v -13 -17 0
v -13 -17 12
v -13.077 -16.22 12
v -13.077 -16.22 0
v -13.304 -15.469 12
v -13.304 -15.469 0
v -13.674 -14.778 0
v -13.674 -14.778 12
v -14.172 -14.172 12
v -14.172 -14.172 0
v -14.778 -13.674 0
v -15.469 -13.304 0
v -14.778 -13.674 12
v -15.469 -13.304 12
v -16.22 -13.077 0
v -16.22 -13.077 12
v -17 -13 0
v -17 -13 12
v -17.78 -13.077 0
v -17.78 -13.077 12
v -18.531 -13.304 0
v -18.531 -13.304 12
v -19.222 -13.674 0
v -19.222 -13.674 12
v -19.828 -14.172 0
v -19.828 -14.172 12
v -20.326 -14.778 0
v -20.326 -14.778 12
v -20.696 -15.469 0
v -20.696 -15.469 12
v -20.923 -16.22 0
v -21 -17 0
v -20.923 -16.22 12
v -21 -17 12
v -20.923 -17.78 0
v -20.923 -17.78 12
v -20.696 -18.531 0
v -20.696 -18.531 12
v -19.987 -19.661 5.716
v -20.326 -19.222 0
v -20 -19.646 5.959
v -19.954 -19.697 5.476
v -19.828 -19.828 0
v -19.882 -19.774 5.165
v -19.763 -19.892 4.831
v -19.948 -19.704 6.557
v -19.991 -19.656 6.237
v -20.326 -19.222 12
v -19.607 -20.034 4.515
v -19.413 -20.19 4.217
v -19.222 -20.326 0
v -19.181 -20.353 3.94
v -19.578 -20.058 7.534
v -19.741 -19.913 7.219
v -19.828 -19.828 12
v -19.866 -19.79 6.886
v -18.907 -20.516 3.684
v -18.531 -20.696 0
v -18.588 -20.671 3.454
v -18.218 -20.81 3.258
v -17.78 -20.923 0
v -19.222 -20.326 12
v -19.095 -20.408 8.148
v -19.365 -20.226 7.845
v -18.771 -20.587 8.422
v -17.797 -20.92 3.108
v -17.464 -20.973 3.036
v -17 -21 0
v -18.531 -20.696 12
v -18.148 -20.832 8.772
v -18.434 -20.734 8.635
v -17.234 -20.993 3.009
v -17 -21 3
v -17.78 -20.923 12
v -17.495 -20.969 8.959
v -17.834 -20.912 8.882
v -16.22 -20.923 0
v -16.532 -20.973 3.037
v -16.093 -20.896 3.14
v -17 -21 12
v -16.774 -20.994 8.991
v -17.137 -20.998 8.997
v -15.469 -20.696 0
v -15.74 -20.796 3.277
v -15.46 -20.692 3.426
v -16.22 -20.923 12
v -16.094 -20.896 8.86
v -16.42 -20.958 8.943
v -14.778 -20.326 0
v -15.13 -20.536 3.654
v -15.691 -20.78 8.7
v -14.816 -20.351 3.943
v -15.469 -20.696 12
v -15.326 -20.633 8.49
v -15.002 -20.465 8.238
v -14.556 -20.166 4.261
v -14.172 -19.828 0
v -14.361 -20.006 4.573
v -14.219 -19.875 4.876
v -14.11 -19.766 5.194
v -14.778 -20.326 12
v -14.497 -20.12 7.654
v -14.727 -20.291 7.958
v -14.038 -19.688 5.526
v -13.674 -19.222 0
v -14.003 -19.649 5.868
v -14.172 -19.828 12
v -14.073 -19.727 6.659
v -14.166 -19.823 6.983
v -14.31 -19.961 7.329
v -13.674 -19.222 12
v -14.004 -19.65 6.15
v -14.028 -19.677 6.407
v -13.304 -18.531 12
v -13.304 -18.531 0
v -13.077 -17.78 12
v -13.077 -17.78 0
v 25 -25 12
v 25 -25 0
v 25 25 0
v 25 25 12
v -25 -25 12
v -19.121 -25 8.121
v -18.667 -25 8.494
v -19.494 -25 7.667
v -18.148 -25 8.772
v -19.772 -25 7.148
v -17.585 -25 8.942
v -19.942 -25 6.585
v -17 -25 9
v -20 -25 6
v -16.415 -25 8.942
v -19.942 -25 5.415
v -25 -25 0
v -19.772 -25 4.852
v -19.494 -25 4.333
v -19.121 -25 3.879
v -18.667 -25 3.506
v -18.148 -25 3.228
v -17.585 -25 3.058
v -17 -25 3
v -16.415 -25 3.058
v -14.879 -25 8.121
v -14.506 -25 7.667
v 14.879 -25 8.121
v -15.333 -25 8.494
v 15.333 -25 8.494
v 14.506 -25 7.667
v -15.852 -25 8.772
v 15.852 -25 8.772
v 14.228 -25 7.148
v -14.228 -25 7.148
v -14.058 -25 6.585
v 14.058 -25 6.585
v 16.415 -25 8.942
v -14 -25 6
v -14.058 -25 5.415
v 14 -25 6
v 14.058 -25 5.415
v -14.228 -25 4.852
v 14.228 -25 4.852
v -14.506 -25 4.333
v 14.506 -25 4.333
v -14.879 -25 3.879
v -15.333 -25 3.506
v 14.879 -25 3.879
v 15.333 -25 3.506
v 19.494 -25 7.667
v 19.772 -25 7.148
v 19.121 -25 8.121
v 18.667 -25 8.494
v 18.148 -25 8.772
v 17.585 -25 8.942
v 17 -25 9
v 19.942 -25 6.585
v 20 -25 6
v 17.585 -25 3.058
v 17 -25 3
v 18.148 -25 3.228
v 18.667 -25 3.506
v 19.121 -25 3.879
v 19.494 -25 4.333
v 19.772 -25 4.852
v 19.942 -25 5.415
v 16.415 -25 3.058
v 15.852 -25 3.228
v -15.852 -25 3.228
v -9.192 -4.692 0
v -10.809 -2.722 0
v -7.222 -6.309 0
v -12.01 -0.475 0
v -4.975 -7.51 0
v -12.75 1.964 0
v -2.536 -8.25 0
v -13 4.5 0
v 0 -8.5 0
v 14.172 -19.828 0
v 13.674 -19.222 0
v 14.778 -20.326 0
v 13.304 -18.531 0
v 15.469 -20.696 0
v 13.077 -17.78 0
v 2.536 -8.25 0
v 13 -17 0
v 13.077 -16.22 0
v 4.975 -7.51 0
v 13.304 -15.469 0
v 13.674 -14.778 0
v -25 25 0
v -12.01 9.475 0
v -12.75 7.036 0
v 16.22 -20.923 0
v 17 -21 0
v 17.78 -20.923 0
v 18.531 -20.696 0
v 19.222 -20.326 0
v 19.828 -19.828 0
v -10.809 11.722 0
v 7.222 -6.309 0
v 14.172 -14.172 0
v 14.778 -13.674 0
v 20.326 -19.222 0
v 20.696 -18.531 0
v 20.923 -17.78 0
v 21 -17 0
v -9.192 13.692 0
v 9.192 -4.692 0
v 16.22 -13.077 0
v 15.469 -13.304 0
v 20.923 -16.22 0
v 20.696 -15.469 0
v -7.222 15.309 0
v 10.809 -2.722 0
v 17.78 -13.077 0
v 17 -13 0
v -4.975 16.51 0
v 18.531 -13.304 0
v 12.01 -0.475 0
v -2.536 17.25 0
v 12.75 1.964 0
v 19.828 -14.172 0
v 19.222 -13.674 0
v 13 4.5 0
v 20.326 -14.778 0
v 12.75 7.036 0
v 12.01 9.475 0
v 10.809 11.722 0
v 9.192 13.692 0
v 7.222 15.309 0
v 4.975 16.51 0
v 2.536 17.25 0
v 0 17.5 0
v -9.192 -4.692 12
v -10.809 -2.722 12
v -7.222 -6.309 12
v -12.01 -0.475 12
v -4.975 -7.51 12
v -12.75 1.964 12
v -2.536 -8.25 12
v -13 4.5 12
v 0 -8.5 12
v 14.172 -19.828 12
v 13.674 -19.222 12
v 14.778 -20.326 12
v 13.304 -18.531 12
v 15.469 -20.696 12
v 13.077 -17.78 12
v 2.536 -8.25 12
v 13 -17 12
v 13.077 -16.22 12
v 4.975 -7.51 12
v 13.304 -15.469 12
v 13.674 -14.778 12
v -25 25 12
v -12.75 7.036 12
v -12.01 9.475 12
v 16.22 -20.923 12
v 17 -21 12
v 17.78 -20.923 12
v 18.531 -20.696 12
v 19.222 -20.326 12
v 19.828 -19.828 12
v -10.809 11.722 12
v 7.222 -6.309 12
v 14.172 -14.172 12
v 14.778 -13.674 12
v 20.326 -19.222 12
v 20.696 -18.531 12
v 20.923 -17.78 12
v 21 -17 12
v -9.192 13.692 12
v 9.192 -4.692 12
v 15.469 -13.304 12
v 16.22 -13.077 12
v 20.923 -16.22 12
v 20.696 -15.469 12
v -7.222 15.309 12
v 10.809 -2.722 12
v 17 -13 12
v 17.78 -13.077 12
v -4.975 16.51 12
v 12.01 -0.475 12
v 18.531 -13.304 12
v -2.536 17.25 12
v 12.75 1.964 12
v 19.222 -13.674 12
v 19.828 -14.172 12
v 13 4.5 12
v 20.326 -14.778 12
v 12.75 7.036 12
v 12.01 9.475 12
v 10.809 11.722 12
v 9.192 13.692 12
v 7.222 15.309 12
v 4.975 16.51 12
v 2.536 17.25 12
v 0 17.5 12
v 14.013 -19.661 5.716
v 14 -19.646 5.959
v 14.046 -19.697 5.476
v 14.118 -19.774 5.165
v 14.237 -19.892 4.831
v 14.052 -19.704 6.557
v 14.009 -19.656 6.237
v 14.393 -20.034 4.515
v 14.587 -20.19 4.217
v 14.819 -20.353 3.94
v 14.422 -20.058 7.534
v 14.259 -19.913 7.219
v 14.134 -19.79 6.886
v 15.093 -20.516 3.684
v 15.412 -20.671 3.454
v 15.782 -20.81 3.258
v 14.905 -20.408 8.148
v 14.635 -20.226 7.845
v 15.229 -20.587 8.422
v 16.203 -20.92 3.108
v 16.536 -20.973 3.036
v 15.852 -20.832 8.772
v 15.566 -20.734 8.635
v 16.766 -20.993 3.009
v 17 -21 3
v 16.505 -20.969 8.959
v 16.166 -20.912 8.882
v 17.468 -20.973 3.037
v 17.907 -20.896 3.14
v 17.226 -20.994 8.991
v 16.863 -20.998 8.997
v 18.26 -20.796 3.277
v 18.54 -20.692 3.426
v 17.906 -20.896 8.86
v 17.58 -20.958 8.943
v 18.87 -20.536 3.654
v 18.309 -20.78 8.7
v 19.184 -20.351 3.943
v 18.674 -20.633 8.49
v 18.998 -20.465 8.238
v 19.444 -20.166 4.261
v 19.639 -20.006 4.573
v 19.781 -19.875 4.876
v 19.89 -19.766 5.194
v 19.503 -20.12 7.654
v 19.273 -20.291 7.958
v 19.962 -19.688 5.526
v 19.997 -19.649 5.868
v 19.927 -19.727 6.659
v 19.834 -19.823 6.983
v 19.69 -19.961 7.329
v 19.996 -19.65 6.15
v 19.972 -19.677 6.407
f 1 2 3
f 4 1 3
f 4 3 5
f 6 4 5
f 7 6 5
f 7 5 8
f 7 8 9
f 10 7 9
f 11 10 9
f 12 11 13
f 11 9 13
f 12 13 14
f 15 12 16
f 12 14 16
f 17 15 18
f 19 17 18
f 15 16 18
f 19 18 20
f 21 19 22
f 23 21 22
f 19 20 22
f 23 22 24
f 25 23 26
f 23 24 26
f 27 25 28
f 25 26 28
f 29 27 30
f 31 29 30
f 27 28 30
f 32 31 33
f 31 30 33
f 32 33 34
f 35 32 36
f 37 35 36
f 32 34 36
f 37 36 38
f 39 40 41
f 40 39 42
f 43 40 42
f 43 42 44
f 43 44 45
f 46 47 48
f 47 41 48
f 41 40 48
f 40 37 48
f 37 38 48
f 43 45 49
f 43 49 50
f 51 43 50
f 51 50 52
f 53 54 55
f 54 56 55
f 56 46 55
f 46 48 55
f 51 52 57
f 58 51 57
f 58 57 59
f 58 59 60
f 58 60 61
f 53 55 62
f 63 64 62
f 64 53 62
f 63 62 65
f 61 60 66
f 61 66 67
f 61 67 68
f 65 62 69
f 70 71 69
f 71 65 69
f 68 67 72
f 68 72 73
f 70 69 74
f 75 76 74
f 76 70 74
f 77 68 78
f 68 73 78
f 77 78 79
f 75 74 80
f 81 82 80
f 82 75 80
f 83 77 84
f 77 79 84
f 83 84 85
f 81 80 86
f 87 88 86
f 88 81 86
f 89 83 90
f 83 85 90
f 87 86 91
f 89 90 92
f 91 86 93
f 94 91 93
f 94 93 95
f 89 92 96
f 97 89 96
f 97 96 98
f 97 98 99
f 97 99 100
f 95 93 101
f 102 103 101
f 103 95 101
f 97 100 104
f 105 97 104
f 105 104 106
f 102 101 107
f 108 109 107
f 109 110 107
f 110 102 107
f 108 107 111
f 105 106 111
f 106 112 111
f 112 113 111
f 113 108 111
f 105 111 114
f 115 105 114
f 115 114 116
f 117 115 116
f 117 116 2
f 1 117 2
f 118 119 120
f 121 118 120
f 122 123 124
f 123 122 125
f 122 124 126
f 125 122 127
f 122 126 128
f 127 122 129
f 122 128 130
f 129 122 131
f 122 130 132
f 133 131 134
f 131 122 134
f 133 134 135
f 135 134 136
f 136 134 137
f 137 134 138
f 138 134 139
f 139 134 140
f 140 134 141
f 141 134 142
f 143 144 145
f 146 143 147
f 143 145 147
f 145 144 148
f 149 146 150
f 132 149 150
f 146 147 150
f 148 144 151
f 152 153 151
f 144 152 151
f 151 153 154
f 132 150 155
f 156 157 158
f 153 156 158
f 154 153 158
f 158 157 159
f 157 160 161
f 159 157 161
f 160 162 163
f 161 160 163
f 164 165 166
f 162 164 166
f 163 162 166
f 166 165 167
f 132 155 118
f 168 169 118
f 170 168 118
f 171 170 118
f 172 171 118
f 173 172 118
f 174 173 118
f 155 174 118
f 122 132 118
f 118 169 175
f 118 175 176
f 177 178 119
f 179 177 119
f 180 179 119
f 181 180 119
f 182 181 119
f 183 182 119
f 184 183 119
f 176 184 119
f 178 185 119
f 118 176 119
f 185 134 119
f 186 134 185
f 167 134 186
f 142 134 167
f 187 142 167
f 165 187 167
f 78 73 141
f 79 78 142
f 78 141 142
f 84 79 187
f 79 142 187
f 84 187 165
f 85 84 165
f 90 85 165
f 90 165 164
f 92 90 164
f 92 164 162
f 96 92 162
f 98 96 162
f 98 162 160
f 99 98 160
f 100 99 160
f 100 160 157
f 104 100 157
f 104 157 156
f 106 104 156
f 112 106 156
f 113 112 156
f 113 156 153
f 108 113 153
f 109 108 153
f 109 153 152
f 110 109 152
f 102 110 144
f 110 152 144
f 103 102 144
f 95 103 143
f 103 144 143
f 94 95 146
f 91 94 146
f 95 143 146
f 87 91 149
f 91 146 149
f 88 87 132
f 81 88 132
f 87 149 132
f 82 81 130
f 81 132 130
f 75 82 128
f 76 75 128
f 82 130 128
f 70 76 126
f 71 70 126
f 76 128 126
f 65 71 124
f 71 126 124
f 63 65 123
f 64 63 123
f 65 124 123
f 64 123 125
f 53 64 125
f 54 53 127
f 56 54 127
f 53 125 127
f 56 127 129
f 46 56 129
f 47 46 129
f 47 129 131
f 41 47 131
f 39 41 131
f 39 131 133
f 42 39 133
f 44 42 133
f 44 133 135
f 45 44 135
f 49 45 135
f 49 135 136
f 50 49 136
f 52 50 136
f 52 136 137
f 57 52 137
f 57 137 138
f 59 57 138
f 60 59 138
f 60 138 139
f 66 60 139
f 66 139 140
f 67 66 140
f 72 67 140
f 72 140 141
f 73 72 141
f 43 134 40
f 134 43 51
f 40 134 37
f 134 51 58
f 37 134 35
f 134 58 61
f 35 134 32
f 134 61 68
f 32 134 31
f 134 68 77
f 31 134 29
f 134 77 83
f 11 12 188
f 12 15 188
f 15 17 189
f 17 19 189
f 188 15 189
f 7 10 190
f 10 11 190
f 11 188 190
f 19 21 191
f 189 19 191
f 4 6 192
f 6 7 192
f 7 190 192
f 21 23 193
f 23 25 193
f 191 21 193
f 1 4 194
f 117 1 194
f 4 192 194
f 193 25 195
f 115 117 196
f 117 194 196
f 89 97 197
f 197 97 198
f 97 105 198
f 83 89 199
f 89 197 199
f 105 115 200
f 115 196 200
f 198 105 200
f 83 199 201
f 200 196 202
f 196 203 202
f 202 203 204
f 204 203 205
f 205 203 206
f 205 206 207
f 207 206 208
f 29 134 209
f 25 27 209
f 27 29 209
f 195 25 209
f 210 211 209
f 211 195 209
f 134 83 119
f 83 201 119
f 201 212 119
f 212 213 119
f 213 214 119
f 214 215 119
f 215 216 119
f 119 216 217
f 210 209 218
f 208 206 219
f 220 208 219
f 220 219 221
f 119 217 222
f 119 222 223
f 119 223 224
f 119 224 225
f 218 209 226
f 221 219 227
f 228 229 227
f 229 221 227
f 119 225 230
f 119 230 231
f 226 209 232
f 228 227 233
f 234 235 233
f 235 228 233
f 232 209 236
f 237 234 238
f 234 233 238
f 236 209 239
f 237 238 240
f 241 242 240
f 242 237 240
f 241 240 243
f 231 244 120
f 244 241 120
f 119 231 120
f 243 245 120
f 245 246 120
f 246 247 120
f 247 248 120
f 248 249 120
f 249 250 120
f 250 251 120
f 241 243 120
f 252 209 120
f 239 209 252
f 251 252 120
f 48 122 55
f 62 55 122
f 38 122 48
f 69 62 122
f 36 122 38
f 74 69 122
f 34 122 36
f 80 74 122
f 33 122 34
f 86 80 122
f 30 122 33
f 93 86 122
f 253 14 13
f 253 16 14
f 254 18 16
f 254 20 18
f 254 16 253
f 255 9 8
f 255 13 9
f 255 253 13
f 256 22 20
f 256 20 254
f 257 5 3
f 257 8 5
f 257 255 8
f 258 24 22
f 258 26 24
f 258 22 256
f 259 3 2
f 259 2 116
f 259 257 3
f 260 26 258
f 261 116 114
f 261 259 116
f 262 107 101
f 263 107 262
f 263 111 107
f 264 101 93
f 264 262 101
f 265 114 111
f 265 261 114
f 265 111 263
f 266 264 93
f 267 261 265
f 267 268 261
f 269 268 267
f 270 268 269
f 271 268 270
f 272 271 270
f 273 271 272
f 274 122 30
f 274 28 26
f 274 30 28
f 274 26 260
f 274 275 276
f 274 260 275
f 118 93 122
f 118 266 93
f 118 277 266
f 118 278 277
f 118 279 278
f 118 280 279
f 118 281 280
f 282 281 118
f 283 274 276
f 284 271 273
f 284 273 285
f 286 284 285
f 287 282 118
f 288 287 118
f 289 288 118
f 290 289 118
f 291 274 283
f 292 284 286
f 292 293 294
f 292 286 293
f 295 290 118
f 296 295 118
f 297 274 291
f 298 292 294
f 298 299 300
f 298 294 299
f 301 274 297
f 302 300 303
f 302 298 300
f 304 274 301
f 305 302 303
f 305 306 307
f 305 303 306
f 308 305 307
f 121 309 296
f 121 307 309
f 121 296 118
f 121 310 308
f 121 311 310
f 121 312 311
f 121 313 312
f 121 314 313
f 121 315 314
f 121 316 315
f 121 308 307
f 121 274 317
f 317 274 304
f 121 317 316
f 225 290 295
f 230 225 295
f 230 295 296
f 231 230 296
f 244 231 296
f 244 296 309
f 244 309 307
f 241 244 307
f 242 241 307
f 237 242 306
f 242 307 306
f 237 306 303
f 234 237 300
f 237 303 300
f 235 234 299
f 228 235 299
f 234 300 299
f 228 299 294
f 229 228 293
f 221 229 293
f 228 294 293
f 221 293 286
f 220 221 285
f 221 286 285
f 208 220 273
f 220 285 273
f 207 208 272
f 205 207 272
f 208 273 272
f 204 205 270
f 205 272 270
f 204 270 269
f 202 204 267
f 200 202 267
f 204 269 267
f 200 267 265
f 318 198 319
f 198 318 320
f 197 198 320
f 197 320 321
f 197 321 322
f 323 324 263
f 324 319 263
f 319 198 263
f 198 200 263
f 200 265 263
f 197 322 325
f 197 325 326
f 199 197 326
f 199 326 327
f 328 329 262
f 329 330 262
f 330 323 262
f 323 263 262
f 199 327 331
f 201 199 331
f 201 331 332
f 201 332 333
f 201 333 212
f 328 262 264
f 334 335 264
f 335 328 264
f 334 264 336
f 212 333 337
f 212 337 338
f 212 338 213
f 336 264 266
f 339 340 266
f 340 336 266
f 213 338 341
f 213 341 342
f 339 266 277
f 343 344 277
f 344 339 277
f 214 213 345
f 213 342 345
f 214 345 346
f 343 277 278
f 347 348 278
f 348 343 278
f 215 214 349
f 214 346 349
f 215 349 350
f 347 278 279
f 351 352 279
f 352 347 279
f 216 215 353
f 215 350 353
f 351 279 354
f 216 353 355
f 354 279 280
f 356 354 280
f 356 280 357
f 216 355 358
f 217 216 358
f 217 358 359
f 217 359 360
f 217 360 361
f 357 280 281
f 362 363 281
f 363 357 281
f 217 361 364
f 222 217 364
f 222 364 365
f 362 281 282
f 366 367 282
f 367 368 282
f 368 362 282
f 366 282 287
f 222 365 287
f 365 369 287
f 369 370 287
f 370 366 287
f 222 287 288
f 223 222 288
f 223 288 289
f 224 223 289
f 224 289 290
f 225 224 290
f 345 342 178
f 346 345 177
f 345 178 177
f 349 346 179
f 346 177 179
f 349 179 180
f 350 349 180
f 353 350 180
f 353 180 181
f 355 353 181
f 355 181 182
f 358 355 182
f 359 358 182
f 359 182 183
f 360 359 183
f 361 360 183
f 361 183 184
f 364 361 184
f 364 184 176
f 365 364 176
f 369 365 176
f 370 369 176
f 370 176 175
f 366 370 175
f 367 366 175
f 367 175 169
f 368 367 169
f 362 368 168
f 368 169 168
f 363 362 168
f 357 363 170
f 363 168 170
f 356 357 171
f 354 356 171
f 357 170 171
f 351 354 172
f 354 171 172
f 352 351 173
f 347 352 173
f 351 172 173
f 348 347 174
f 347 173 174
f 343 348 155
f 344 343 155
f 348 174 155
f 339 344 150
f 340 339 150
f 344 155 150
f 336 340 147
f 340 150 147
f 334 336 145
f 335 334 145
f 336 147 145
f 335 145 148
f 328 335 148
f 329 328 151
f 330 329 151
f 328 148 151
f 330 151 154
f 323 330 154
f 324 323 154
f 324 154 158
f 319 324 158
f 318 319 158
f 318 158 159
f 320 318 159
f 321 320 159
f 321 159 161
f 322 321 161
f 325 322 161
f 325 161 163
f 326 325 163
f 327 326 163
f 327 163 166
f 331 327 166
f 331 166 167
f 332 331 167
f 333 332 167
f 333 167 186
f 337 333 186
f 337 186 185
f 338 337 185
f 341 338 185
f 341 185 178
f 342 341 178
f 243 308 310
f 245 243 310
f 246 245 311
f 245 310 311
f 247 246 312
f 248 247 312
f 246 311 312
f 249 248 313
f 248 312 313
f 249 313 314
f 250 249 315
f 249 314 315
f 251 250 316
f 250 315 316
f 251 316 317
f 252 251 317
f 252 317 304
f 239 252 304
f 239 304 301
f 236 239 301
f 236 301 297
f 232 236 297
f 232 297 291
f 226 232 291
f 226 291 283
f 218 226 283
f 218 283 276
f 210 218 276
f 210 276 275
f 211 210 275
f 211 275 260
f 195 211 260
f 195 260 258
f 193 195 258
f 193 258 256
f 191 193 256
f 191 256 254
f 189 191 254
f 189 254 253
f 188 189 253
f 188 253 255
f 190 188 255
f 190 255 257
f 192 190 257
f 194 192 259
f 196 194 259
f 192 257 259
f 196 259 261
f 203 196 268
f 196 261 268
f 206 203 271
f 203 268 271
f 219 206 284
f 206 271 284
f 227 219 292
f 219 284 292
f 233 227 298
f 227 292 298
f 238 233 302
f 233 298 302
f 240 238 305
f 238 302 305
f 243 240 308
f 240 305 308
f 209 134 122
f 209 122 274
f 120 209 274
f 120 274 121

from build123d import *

# Parameters (mm, degrees)
SKETCH1_W           = 50
SKETCH1_H           = 50
BOSS_EXTRUDE1_DEPTH = 12
CUT_EXTRUDE1_REACH  = 39.336
SKETCH2_R           = 13
CUT_EXTRUDE2_REACH  = 39.336
SKETCH3_R           = 4
CUT_EXTRUDE3_REACH  = 59.175
SKETCH4_R           = 3


with BuildPart() as part:
    # Sketch1 → Boss-Extrude1 (new body)
    with BuildSketch(Plane.XY):
        Rectangle(SKETCH1_W, SKETCH1_H)
    extrude(amount=BOSS_EXTRUDE1_DEPTH)

    # Sketch2 → Cut-Extrude1 (cut, up to next)
    with BuildSketch(Plane.XY.offset(12), mode=Mode.PRIVATE) as cut_extrude1_sk1:
        with Locations((0, 4.5)):
            Circle(SKETCH2_R)
    cut_extrude1_tool1 = extrude(cut_extrude1_sk1.sketch, amount=-CUT_EXTRUDE1_REACH, mode=Mode.PRIVATE) & part.part
    add(cut_extrude1_tool1.solids().sort_by_distance((0, 4.5, 12))[0], mode=Mode.SUBTRACT)

    # Sketch3 → Cut-Extrude2 (cut, up to next)
    with BuildSketch(Plane.XY.offset(12), mode=Mode.PRIVATE) as cut_extrude2_sk1:
        with Locations((-17, -17)):
            Circle(SKETCH3_R)
    cut_extrude2_tool1 = extrude(cut_extrude2_sk1.sketch, amount=-CUT_EXTRUDE2_REACH, mode=Mode.PRIVATE) & part.part
    # Sketch3 → Cut-Extrude2 (cut, up to next)
    with BuildSketch(Plane.XY.offset(12), mode=Mode.PRIVATE) as cut_extrude2_sk2:
        with Locations((17, -17)):
            Circle(SKETCH3_R)
    cut_extrude2_tool2 = extrude(cut_extrude2_sk2.sketch, amount=-CUT_EXTRUDE2_REACH, mode=Mode.PRIVATE) & part.part
    add(cut_extrude2_tool1.solids().sort_by_distance((-17, -17, 12))[0], mode=Mode.SUBTRACT)
    add(cut_extrude2_tool2.solids().sort_by_distance((17, -17, 12))[0], mode=Mode.SUBTRACT)

    # Sketch4 → Cut-Extrude3 (cut, up to next)
    with BuildSketch(Plane.XZ.offset(25), mode=Mode.PRIVATE) as cut_extrude3_sk1:
        with Locations(Location((17, 6, 0), (0, 0, 270))):
            Circle(SKETCH4_R)
    cut_extrude3_tool1 = extrude(cut_extrude3_sk1.sketch, amount=-CUT_EXTRUDE3_REACH, mode=Mode.PRIVATE) & part.part
    # Sketch4 → Cut-Extrude3 (cut, up to next)
    with BuildSketch(Plane.XZ.offset(25), mode=Mode.PRIVATE) as cut_extrude3_sk2:
        with Locations(Location((-17, 6, 0), (0, 0, 270))):
            Circle(SKETCH4_R)
    cut_extrude3_tool2 = extrude(cut_extrude3_sk2.sketch, amount=-CUT_EXTRUDE3_REACH, mode=Mode.PRIVATE) & part.part
    add(cut_extrude3_tool1.solids().sort_by_distance((17, -25, 6))[0], mode=Mode.SUBTRACT)
    add(cut_extrude3_tool2.solids().sort_by_distance((-17, -25, 6))[0], mode=Mode.SUBTRACT)


solid = part.part
